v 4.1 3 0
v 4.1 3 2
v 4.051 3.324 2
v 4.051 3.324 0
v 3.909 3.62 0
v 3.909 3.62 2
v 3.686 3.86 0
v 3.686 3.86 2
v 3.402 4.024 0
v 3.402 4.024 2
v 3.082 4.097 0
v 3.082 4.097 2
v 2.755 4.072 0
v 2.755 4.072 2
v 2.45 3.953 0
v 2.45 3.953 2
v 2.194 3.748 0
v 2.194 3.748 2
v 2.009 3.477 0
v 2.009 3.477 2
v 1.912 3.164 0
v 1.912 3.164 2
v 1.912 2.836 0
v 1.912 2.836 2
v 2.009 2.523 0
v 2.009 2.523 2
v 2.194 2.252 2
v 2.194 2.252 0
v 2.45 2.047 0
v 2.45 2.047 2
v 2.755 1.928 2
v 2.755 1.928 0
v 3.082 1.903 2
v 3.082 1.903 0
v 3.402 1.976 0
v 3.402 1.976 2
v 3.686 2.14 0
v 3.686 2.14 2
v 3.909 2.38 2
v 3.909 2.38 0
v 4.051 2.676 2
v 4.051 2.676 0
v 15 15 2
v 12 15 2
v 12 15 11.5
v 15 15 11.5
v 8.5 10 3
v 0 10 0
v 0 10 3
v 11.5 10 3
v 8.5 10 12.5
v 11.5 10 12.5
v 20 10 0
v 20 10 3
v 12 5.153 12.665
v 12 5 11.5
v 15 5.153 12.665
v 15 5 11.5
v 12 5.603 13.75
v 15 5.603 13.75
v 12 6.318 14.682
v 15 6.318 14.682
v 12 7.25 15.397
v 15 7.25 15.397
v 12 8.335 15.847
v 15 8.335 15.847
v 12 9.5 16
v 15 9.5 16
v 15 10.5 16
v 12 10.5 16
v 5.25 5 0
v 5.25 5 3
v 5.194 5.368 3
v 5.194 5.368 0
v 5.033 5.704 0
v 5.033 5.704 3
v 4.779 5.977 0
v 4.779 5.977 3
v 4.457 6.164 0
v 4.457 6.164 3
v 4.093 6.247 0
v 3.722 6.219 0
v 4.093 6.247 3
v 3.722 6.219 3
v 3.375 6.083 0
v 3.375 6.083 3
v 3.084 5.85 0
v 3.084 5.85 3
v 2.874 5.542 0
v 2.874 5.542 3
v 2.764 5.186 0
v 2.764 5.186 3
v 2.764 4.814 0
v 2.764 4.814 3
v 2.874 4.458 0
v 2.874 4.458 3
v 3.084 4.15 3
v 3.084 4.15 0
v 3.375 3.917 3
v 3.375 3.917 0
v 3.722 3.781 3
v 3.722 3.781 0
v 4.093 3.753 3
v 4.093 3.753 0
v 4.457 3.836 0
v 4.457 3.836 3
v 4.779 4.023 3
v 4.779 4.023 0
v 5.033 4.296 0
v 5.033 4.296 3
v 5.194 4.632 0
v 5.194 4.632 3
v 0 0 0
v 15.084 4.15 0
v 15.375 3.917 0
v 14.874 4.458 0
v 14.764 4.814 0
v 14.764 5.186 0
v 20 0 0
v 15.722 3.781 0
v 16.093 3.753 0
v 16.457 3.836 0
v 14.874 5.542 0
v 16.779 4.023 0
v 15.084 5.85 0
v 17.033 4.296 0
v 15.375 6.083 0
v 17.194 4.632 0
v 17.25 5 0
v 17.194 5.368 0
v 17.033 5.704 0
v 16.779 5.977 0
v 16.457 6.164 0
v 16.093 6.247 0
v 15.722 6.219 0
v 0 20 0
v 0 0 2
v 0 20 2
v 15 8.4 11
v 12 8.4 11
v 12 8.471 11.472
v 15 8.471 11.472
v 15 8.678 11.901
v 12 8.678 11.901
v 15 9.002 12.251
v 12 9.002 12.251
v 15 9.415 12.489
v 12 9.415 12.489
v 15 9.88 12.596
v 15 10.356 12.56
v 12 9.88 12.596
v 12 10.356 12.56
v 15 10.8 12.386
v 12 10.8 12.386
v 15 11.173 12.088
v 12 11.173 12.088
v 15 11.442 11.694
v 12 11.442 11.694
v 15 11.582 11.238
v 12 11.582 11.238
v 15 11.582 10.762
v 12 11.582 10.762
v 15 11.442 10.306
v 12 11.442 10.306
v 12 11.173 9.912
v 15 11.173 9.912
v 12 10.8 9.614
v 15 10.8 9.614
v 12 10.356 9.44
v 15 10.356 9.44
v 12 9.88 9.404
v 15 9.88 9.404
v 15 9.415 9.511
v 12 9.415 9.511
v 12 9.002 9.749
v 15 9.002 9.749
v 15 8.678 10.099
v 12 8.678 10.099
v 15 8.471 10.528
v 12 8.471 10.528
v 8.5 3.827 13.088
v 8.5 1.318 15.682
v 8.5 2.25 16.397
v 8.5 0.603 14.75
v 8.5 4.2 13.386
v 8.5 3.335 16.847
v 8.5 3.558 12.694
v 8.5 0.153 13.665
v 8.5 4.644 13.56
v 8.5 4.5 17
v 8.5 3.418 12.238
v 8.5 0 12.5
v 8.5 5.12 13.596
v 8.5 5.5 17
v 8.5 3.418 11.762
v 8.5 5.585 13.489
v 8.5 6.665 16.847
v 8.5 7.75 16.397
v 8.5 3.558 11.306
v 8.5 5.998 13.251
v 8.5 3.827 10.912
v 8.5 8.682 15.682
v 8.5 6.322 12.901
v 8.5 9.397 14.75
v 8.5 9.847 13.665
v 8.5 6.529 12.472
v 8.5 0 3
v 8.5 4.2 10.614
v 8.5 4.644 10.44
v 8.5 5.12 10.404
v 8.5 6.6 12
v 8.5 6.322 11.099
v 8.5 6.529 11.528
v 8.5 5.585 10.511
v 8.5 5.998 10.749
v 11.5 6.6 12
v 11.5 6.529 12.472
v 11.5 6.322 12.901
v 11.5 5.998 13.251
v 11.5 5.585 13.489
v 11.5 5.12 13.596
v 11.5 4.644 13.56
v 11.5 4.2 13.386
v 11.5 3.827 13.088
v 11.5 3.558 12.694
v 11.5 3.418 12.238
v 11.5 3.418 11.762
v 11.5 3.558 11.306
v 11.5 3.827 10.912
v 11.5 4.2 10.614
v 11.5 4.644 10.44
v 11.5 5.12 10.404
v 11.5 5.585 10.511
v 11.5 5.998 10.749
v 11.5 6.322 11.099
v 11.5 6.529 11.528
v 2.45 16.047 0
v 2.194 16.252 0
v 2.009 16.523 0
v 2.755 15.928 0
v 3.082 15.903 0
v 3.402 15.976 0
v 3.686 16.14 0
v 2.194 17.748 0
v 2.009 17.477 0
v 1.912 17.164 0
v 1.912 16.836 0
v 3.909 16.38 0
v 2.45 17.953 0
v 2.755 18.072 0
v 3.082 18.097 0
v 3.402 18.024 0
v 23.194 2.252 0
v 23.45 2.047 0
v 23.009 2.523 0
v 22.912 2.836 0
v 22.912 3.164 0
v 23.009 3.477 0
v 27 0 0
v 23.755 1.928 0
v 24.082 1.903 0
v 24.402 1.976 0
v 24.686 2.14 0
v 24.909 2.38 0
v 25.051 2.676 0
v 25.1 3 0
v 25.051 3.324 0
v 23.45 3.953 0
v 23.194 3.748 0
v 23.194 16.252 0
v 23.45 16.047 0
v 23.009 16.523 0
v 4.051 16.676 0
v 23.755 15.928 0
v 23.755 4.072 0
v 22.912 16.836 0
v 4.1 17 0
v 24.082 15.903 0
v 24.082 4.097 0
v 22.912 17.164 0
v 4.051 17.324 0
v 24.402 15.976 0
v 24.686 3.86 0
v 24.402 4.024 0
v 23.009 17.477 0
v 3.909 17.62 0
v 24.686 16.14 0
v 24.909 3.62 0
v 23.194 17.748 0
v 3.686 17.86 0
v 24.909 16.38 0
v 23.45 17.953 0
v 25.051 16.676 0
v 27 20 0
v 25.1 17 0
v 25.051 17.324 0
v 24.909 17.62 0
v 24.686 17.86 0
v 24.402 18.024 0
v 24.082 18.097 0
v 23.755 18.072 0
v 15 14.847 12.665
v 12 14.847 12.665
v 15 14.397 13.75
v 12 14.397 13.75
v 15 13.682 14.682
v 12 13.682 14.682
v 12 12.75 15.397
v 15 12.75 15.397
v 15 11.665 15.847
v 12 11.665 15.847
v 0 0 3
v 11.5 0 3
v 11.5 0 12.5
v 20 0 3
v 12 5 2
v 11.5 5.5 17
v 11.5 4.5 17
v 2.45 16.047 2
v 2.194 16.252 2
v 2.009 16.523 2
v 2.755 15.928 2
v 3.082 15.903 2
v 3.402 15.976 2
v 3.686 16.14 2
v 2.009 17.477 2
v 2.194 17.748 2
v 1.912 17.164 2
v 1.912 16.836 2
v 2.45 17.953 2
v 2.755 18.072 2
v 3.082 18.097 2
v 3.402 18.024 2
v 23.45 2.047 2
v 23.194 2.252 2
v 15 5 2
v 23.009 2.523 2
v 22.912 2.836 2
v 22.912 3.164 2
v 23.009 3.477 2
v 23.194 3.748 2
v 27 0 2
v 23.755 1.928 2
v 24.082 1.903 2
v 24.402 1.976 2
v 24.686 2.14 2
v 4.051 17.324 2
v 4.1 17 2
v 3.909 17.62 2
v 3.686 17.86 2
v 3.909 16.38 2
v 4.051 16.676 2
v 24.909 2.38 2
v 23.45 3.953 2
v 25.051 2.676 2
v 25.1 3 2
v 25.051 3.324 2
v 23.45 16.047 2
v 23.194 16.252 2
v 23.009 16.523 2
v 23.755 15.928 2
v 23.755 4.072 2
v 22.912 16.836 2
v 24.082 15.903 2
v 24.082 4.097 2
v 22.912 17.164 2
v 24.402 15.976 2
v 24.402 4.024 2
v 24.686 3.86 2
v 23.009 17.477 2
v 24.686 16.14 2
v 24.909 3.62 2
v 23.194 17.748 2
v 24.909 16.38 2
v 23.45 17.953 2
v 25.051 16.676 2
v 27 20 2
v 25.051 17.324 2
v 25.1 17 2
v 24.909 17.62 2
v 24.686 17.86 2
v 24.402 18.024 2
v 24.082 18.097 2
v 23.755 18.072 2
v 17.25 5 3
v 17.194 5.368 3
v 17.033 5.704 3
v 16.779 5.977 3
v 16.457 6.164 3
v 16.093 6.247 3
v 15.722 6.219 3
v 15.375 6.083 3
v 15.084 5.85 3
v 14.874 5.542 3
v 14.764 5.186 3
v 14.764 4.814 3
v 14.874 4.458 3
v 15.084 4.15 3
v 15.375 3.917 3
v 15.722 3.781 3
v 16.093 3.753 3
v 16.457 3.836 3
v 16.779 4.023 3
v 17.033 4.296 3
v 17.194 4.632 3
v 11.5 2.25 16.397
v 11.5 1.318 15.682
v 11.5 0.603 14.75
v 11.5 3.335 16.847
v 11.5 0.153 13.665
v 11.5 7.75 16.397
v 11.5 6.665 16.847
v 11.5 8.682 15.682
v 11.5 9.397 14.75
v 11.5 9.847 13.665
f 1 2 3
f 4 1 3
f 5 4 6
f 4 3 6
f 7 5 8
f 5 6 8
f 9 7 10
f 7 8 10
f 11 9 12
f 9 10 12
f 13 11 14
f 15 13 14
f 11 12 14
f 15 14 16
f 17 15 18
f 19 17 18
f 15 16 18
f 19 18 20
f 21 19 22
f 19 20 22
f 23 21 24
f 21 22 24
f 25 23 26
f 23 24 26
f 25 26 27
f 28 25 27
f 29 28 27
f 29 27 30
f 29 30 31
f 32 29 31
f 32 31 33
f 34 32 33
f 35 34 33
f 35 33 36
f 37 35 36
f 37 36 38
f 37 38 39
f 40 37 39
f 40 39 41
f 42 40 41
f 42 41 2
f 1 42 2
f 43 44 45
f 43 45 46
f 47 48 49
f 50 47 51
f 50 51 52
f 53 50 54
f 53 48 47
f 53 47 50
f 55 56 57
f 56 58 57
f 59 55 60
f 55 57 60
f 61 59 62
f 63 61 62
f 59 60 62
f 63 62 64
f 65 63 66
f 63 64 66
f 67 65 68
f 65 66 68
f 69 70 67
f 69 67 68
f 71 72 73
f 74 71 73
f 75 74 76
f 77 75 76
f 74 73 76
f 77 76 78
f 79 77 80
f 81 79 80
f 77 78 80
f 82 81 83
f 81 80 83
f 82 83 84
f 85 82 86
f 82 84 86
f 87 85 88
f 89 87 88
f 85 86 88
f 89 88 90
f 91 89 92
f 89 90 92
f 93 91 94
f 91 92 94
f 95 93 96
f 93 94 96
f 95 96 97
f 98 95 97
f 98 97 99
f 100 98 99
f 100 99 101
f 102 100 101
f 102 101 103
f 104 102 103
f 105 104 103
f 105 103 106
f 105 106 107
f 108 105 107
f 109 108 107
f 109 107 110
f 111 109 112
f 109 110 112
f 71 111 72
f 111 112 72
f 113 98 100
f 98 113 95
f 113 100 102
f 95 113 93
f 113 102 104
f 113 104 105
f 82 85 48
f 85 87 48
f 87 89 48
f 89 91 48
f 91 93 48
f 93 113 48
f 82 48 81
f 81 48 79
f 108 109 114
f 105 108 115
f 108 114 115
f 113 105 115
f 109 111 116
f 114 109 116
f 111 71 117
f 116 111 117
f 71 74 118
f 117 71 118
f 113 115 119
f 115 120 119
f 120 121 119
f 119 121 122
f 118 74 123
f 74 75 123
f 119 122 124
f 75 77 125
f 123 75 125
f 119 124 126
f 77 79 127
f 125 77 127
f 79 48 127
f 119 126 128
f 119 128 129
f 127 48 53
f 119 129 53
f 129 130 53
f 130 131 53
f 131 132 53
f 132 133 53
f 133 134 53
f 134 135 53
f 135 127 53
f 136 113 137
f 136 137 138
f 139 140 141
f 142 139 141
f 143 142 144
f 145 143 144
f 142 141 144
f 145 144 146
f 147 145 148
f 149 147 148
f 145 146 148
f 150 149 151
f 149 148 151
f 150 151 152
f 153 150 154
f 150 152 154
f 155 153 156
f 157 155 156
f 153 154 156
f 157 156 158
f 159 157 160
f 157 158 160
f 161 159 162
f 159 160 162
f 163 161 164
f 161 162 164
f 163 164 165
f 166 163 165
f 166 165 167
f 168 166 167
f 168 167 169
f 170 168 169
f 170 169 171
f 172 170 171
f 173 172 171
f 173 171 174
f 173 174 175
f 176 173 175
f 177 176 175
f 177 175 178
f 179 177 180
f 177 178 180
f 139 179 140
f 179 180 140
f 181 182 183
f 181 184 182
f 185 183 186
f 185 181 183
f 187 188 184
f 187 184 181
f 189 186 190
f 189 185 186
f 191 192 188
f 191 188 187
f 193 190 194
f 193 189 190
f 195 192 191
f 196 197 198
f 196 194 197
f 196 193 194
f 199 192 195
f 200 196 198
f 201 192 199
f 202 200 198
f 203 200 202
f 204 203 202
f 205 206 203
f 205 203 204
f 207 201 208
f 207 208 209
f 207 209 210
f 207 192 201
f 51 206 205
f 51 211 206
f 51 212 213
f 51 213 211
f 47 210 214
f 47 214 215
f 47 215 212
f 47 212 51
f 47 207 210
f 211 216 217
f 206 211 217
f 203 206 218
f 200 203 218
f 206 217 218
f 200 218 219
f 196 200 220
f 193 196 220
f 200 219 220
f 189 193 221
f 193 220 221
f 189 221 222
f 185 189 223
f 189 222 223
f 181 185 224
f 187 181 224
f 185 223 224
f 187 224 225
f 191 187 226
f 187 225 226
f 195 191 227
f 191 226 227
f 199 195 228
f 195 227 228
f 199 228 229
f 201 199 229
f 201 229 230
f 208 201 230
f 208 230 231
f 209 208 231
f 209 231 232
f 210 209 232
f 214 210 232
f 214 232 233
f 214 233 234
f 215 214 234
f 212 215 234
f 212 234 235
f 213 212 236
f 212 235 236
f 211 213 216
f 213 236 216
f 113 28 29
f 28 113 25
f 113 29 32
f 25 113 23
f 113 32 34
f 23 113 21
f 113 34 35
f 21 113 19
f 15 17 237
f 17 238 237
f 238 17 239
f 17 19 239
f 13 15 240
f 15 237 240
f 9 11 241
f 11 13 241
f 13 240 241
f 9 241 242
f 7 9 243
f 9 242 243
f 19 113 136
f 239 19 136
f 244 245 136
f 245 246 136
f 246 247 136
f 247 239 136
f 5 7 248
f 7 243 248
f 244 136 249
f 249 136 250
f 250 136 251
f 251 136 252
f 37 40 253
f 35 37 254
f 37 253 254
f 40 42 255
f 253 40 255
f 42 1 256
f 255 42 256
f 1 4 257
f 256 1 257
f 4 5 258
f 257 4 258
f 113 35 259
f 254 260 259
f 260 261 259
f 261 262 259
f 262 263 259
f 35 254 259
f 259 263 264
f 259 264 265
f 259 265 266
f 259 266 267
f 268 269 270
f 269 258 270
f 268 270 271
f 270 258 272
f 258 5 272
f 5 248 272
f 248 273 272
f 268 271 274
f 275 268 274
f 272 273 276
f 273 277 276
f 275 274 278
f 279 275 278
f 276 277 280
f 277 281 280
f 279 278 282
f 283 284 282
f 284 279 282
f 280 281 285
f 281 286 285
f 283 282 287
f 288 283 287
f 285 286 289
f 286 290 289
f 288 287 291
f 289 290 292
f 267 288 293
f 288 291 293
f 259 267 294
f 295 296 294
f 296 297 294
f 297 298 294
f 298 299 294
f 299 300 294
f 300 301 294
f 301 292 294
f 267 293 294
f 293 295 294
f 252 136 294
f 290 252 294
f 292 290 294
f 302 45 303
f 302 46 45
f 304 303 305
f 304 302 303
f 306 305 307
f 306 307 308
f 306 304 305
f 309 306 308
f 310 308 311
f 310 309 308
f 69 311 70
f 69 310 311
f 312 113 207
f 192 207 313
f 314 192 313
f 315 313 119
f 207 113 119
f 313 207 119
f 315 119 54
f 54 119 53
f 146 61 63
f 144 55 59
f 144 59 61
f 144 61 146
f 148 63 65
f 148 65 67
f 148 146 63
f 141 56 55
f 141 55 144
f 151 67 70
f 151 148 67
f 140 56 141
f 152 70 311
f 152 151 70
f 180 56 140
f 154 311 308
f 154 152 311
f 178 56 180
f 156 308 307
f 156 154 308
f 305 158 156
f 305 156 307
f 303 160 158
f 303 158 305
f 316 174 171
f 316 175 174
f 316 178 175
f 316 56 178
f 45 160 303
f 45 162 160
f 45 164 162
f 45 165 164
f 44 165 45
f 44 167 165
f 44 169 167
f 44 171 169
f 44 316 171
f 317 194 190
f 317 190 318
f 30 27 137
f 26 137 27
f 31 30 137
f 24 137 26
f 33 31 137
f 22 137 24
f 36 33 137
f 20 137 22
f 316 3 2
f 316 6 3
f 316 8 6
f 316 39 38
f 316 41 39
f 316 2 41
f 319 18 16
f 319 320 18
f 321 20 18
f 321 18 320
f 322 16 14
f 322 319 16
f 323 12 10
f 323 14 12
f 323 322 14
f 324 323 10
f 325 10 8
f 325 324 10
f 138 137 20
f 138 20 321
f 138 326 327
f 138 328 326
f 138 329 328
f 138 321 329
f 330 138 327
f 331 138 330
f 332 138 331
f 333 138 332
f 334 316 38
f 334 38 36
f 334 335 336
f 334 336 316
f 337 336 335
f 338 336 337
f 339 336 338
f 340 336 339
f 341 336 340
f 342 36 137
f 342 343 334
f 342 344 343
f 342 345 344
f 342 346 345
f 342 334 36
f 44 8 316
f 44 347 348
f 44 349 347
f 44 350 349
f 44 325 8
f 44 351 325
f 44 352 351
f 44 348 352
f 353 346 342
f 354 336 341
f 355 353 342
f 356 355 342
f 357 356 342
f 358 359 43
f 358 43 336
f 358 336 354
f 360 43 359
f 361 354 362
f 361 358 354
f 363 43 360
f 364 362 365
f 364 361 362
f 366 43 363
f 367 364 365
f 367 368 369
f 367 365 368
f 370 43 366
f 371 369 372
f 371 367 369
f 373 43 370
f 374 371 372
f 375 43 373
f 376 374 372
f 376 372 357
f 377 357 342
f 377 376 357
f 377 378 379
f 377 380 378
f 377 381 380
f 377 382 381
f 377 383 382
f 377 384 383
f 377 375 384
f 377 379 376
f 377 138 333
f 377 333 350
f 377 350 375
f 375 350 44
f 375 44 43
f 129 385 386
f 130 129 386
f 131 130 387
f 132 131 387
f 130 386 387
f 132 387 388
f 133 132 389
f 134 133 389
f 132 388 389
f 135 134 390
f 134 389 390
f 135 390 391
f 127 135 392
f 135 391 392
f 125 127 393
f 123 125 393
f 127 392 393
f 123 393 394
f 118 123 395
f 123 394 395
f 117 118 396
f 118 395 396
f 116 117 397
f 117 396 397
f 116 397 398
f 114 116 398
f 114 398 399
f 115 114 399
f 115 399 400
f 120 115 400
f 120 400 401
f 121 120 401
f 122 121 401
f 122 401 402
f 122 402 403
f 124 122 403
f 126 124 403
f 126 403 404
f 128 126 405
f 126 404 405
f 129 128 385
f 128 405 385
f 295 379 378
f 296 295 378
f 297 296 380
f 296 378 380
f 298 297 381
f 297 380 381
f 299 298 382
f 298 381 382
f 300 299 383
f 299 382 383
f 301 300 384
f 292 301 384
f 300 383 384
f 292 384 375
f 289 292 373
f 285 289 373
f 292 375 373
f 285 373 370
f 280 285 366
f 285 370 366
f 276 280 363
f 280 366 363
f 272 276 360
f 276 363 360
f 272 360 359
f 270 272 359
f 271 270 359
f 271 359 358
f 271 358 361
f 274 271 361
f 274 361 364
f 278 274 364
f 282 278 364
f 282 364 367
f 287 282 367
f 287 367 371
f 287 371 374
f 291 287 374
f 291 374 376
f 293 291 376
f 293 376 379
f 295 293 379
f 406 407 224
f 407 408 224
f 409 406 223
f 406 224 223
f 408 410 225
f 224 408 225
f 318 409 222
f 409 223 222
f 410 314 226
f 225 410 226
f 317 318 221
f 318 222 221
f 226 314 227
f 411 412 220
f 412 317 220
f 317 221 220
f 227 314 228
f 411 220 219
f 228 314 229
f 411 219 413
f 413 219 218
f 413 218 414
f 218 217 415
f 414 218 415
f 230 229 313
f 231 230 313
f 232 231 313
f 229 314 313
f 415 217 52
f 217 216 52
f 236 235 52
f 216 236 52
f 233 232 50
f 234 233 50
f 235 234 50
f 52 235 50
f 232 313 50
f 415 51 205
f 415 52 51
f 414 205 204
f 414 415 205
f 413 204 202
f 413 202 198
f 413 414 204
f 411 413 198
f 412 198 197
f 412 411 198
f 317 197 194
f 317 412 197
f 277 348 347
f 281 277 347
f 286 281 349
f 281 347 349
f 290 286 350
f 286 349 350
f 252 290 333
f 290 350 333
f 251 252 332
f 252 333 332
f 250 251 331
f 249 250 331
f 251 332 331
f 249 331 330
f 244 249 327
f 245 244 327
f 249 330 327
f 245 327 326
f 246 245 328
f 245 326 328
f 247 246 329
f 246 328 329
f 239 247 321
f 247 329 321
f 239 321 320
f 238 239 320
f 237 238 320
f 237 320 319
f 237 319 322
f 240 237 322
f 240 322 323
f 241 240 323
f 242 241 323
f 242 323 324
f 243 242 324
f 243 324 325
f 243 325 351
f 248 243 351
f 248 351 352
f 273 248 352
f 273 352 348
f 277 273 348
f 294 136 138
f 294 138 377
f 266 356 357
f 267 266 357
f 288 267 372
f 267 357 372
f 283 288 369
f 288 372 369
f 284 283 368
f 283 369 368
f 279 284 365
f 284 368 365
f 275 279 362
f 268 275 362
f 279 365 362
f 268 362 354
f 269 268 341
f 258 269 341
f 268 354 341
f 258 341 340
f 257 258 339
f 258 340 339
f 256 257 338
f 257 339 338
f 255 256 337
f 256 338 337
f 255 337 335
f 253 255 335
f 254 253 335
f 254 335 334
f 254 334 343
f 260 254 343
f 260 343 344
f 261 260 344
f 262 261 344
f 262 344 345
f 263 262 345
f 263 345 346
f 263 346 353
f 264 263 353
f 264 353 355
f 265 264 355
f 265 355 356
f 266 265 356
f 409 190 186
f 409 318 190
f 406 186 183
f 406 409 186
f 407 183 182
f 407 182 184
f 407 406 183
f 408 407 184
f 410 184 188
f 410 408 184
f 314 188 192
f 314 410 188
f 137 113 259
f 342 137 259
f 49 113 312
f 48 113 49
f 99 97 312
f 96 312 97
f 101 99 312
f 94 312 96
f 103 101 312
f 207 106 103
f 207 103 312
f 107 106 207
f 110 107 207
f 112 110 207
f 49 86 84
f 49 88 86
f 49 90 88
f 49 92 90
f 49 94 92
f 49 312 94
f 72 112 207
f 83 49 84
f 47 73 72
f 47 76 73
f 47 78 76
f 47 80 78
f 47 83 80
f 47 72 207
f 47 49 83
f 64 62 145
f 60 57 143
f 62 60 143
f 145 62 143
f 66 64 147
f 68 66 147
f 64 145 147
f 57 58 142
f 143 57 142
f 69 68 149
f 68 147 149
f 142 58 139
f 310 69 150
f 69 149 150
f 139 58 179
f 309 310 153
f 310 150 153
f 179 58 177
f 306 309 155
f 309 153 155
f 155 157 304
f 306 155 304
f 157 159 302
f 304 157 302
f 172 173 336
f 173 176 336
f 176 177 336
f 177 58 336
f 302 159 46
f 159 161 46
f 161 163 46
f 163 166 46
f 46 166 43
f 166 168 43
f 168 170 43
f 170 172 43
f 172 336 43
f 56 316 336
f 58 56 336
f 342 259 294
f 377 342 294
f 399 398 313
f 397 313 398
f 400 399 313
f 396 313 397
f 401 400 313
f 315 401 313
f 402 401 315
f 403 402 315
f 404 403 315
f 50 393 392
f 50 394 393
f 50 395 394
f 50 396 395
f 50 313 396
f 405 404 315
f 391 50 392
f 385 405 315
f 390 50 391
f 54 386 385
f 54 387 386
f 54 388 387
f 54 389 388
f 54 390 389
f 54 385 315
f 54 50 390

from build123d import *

# Parameters (mm, degrees)
SKETCH_W        = 20
SKETCH_H        = 10
PAD_DEPTH       = 3
SKETCH001_W     = 3
SKETCH001_H     = 10
PAD001_DEPTH    = 14
SKETCH002_R     = 1.25
POCKET_DEPTH    = 3
SKETCH003_R     = 1.6
POCKET001_DEPTH = 3
FILLET_R        = 4.5
FILLET001_R     = 4.5
SKETCH004_W     = 27
SKETCH004_H     = 20
PAD002_DEPTH    = 2
SKETCH005_W     = 3
SKETCH005_H     = 10
PAD003_DEPTH    = 14
SKETCH007_R     = 1.1
POCKET002_DEPTH = 3
SKETCH006_R     = 1.6
POCKET003_DEPTH = 3
POCKET004_DEPTH = 3
FILLET002_R     = 4.5


with BuildPart() as body:
    # Sketch → Pad (new body)
    with BuildSketch(Plane.XY):
        with Locations((10, 5)):
            Rectangle(SKETCH_W, SKETCH_H)
    extrude(amount=PAD_DEPTH)

    # Sketch001 (on Face6 of Pad) → Pad001 (join)
    with BuildSketch(Plane.XY.offset(3)):
        with Locations((10, 5)):
            Rectangle(SKETCH001_W, SKETCH001_H)
    extrude(amount=PAD001_DEPTH)

    # Sketch002 (on Face5 of Pad001) → Pocket (cut)
    with BuildSketch(Plane.XY.offset(3)):
        with Locations((4, 5)):
            Circle(SKETCH002_R)
        with Locations((16, 5)):
            Circle(SKETCH002_R)
    extrude(amount=-POCKET_DEPTH, mode=Mode.SUBTRACT)

    # Sketch003 (on Face10 of Pad001) → Pocket001 (cut)
    with BuildSketch(Plane.YZ.offset(11.5)):
        with Locations((5, 12)):
            Circle(SKETCH003_R)
    extrude(amount=-POCKET001_DEPTH, mode=Mode.SUBTRACT)

    # Fillet
    fillet_edges = [body.edges().sort_by_distance(p)[0] for p in [
        (10, 10, 17),
    ]]
    fillet(fillet_edges, radius=FILLET_R)

    # Fillet001
    fillet001_edges = [body.edges().sort_by_distance(p)[0] for p in [
        (10, 0, 17),
    ]]
    fillet(fillet001_edges, radius=FILLET001_R)


with BuildPart() as body2:
    # Sketch004 → Pad002 (new body)
    with BuildSketch(Plane.XY):
        with Locations((13.5, 10)):
            Rectangle(SKETCH004_W, SKETCH004_H)
    extrude(amount=PAD002_DEPTH)

    # Sketch005 (on Face6 of Pad002) → Pad003 (join)
    with BuildSketch(Plane.XY.offset(2)):
        with Locations((13.5, 10)):
            Rectangle(SKETCH005_W, SKETCH005_H)
    extrude(amount=PAD003_DEPTH)

    # Sketch007 (on Face5 of Pad003) → Pocket002 (cut)
    with BuildSketch(Plane.XY.offset(2)):
        with Locations((3, 17)):
            Circle(SKETCH007_R)
        with Locations((24, 17)):
            Circle(SKETCH007_R)
        with Locations((3, 3)):
            Circle(SKETCH007_R)
        with Locations((24, 3)):
            Circle(SKETCH007_R)
    extrude(amount=-POCKET002_DEPTH, mode=Mode.SUBTRACT)

    # Sketch006 (on Face10 of Pad003) → Pocket003 (cut)
    with BuildSketch(Plane(origin=(12, 0, 0), x_dir=(0, -1, 0), z_dir=(-1, 0, 0))):
        with Locations((-10, 11)):
            Circle(SKETCH006_R)
    extrude(amount=-POCKET003_DEPTH, mode=Mode.SUBTRACT)

    # Sketch007 (on Face5 of Pad003) → Pocket004 (cut)
    with BuildSketch(Plane.XY.offset(2)):
        with Locations((3, 17)):
            Circle(SKETCH007_R)
        with Locations((24, 17)):
            Circle(SKETCH007_R)
        with Locations((3, 3)):
            Circle(SKETCH007_R)
        with Locations((24, 3)):
            Circle(SKETCH007_R)
    extrude(amount=-POCKET004_DEPTH, mode=Mode.SUBTRACT)

    # Fillet002
    fillet002_edges = [body2.edges().sort_by_distance(p)[0] for p in [
        (13.5, 15, 16),
        (13.5, 5, 16),
    ]]
    fillet(fillet002_edges, radius=FILLET002_R)


solid = Compound([body.part, body2.part])
